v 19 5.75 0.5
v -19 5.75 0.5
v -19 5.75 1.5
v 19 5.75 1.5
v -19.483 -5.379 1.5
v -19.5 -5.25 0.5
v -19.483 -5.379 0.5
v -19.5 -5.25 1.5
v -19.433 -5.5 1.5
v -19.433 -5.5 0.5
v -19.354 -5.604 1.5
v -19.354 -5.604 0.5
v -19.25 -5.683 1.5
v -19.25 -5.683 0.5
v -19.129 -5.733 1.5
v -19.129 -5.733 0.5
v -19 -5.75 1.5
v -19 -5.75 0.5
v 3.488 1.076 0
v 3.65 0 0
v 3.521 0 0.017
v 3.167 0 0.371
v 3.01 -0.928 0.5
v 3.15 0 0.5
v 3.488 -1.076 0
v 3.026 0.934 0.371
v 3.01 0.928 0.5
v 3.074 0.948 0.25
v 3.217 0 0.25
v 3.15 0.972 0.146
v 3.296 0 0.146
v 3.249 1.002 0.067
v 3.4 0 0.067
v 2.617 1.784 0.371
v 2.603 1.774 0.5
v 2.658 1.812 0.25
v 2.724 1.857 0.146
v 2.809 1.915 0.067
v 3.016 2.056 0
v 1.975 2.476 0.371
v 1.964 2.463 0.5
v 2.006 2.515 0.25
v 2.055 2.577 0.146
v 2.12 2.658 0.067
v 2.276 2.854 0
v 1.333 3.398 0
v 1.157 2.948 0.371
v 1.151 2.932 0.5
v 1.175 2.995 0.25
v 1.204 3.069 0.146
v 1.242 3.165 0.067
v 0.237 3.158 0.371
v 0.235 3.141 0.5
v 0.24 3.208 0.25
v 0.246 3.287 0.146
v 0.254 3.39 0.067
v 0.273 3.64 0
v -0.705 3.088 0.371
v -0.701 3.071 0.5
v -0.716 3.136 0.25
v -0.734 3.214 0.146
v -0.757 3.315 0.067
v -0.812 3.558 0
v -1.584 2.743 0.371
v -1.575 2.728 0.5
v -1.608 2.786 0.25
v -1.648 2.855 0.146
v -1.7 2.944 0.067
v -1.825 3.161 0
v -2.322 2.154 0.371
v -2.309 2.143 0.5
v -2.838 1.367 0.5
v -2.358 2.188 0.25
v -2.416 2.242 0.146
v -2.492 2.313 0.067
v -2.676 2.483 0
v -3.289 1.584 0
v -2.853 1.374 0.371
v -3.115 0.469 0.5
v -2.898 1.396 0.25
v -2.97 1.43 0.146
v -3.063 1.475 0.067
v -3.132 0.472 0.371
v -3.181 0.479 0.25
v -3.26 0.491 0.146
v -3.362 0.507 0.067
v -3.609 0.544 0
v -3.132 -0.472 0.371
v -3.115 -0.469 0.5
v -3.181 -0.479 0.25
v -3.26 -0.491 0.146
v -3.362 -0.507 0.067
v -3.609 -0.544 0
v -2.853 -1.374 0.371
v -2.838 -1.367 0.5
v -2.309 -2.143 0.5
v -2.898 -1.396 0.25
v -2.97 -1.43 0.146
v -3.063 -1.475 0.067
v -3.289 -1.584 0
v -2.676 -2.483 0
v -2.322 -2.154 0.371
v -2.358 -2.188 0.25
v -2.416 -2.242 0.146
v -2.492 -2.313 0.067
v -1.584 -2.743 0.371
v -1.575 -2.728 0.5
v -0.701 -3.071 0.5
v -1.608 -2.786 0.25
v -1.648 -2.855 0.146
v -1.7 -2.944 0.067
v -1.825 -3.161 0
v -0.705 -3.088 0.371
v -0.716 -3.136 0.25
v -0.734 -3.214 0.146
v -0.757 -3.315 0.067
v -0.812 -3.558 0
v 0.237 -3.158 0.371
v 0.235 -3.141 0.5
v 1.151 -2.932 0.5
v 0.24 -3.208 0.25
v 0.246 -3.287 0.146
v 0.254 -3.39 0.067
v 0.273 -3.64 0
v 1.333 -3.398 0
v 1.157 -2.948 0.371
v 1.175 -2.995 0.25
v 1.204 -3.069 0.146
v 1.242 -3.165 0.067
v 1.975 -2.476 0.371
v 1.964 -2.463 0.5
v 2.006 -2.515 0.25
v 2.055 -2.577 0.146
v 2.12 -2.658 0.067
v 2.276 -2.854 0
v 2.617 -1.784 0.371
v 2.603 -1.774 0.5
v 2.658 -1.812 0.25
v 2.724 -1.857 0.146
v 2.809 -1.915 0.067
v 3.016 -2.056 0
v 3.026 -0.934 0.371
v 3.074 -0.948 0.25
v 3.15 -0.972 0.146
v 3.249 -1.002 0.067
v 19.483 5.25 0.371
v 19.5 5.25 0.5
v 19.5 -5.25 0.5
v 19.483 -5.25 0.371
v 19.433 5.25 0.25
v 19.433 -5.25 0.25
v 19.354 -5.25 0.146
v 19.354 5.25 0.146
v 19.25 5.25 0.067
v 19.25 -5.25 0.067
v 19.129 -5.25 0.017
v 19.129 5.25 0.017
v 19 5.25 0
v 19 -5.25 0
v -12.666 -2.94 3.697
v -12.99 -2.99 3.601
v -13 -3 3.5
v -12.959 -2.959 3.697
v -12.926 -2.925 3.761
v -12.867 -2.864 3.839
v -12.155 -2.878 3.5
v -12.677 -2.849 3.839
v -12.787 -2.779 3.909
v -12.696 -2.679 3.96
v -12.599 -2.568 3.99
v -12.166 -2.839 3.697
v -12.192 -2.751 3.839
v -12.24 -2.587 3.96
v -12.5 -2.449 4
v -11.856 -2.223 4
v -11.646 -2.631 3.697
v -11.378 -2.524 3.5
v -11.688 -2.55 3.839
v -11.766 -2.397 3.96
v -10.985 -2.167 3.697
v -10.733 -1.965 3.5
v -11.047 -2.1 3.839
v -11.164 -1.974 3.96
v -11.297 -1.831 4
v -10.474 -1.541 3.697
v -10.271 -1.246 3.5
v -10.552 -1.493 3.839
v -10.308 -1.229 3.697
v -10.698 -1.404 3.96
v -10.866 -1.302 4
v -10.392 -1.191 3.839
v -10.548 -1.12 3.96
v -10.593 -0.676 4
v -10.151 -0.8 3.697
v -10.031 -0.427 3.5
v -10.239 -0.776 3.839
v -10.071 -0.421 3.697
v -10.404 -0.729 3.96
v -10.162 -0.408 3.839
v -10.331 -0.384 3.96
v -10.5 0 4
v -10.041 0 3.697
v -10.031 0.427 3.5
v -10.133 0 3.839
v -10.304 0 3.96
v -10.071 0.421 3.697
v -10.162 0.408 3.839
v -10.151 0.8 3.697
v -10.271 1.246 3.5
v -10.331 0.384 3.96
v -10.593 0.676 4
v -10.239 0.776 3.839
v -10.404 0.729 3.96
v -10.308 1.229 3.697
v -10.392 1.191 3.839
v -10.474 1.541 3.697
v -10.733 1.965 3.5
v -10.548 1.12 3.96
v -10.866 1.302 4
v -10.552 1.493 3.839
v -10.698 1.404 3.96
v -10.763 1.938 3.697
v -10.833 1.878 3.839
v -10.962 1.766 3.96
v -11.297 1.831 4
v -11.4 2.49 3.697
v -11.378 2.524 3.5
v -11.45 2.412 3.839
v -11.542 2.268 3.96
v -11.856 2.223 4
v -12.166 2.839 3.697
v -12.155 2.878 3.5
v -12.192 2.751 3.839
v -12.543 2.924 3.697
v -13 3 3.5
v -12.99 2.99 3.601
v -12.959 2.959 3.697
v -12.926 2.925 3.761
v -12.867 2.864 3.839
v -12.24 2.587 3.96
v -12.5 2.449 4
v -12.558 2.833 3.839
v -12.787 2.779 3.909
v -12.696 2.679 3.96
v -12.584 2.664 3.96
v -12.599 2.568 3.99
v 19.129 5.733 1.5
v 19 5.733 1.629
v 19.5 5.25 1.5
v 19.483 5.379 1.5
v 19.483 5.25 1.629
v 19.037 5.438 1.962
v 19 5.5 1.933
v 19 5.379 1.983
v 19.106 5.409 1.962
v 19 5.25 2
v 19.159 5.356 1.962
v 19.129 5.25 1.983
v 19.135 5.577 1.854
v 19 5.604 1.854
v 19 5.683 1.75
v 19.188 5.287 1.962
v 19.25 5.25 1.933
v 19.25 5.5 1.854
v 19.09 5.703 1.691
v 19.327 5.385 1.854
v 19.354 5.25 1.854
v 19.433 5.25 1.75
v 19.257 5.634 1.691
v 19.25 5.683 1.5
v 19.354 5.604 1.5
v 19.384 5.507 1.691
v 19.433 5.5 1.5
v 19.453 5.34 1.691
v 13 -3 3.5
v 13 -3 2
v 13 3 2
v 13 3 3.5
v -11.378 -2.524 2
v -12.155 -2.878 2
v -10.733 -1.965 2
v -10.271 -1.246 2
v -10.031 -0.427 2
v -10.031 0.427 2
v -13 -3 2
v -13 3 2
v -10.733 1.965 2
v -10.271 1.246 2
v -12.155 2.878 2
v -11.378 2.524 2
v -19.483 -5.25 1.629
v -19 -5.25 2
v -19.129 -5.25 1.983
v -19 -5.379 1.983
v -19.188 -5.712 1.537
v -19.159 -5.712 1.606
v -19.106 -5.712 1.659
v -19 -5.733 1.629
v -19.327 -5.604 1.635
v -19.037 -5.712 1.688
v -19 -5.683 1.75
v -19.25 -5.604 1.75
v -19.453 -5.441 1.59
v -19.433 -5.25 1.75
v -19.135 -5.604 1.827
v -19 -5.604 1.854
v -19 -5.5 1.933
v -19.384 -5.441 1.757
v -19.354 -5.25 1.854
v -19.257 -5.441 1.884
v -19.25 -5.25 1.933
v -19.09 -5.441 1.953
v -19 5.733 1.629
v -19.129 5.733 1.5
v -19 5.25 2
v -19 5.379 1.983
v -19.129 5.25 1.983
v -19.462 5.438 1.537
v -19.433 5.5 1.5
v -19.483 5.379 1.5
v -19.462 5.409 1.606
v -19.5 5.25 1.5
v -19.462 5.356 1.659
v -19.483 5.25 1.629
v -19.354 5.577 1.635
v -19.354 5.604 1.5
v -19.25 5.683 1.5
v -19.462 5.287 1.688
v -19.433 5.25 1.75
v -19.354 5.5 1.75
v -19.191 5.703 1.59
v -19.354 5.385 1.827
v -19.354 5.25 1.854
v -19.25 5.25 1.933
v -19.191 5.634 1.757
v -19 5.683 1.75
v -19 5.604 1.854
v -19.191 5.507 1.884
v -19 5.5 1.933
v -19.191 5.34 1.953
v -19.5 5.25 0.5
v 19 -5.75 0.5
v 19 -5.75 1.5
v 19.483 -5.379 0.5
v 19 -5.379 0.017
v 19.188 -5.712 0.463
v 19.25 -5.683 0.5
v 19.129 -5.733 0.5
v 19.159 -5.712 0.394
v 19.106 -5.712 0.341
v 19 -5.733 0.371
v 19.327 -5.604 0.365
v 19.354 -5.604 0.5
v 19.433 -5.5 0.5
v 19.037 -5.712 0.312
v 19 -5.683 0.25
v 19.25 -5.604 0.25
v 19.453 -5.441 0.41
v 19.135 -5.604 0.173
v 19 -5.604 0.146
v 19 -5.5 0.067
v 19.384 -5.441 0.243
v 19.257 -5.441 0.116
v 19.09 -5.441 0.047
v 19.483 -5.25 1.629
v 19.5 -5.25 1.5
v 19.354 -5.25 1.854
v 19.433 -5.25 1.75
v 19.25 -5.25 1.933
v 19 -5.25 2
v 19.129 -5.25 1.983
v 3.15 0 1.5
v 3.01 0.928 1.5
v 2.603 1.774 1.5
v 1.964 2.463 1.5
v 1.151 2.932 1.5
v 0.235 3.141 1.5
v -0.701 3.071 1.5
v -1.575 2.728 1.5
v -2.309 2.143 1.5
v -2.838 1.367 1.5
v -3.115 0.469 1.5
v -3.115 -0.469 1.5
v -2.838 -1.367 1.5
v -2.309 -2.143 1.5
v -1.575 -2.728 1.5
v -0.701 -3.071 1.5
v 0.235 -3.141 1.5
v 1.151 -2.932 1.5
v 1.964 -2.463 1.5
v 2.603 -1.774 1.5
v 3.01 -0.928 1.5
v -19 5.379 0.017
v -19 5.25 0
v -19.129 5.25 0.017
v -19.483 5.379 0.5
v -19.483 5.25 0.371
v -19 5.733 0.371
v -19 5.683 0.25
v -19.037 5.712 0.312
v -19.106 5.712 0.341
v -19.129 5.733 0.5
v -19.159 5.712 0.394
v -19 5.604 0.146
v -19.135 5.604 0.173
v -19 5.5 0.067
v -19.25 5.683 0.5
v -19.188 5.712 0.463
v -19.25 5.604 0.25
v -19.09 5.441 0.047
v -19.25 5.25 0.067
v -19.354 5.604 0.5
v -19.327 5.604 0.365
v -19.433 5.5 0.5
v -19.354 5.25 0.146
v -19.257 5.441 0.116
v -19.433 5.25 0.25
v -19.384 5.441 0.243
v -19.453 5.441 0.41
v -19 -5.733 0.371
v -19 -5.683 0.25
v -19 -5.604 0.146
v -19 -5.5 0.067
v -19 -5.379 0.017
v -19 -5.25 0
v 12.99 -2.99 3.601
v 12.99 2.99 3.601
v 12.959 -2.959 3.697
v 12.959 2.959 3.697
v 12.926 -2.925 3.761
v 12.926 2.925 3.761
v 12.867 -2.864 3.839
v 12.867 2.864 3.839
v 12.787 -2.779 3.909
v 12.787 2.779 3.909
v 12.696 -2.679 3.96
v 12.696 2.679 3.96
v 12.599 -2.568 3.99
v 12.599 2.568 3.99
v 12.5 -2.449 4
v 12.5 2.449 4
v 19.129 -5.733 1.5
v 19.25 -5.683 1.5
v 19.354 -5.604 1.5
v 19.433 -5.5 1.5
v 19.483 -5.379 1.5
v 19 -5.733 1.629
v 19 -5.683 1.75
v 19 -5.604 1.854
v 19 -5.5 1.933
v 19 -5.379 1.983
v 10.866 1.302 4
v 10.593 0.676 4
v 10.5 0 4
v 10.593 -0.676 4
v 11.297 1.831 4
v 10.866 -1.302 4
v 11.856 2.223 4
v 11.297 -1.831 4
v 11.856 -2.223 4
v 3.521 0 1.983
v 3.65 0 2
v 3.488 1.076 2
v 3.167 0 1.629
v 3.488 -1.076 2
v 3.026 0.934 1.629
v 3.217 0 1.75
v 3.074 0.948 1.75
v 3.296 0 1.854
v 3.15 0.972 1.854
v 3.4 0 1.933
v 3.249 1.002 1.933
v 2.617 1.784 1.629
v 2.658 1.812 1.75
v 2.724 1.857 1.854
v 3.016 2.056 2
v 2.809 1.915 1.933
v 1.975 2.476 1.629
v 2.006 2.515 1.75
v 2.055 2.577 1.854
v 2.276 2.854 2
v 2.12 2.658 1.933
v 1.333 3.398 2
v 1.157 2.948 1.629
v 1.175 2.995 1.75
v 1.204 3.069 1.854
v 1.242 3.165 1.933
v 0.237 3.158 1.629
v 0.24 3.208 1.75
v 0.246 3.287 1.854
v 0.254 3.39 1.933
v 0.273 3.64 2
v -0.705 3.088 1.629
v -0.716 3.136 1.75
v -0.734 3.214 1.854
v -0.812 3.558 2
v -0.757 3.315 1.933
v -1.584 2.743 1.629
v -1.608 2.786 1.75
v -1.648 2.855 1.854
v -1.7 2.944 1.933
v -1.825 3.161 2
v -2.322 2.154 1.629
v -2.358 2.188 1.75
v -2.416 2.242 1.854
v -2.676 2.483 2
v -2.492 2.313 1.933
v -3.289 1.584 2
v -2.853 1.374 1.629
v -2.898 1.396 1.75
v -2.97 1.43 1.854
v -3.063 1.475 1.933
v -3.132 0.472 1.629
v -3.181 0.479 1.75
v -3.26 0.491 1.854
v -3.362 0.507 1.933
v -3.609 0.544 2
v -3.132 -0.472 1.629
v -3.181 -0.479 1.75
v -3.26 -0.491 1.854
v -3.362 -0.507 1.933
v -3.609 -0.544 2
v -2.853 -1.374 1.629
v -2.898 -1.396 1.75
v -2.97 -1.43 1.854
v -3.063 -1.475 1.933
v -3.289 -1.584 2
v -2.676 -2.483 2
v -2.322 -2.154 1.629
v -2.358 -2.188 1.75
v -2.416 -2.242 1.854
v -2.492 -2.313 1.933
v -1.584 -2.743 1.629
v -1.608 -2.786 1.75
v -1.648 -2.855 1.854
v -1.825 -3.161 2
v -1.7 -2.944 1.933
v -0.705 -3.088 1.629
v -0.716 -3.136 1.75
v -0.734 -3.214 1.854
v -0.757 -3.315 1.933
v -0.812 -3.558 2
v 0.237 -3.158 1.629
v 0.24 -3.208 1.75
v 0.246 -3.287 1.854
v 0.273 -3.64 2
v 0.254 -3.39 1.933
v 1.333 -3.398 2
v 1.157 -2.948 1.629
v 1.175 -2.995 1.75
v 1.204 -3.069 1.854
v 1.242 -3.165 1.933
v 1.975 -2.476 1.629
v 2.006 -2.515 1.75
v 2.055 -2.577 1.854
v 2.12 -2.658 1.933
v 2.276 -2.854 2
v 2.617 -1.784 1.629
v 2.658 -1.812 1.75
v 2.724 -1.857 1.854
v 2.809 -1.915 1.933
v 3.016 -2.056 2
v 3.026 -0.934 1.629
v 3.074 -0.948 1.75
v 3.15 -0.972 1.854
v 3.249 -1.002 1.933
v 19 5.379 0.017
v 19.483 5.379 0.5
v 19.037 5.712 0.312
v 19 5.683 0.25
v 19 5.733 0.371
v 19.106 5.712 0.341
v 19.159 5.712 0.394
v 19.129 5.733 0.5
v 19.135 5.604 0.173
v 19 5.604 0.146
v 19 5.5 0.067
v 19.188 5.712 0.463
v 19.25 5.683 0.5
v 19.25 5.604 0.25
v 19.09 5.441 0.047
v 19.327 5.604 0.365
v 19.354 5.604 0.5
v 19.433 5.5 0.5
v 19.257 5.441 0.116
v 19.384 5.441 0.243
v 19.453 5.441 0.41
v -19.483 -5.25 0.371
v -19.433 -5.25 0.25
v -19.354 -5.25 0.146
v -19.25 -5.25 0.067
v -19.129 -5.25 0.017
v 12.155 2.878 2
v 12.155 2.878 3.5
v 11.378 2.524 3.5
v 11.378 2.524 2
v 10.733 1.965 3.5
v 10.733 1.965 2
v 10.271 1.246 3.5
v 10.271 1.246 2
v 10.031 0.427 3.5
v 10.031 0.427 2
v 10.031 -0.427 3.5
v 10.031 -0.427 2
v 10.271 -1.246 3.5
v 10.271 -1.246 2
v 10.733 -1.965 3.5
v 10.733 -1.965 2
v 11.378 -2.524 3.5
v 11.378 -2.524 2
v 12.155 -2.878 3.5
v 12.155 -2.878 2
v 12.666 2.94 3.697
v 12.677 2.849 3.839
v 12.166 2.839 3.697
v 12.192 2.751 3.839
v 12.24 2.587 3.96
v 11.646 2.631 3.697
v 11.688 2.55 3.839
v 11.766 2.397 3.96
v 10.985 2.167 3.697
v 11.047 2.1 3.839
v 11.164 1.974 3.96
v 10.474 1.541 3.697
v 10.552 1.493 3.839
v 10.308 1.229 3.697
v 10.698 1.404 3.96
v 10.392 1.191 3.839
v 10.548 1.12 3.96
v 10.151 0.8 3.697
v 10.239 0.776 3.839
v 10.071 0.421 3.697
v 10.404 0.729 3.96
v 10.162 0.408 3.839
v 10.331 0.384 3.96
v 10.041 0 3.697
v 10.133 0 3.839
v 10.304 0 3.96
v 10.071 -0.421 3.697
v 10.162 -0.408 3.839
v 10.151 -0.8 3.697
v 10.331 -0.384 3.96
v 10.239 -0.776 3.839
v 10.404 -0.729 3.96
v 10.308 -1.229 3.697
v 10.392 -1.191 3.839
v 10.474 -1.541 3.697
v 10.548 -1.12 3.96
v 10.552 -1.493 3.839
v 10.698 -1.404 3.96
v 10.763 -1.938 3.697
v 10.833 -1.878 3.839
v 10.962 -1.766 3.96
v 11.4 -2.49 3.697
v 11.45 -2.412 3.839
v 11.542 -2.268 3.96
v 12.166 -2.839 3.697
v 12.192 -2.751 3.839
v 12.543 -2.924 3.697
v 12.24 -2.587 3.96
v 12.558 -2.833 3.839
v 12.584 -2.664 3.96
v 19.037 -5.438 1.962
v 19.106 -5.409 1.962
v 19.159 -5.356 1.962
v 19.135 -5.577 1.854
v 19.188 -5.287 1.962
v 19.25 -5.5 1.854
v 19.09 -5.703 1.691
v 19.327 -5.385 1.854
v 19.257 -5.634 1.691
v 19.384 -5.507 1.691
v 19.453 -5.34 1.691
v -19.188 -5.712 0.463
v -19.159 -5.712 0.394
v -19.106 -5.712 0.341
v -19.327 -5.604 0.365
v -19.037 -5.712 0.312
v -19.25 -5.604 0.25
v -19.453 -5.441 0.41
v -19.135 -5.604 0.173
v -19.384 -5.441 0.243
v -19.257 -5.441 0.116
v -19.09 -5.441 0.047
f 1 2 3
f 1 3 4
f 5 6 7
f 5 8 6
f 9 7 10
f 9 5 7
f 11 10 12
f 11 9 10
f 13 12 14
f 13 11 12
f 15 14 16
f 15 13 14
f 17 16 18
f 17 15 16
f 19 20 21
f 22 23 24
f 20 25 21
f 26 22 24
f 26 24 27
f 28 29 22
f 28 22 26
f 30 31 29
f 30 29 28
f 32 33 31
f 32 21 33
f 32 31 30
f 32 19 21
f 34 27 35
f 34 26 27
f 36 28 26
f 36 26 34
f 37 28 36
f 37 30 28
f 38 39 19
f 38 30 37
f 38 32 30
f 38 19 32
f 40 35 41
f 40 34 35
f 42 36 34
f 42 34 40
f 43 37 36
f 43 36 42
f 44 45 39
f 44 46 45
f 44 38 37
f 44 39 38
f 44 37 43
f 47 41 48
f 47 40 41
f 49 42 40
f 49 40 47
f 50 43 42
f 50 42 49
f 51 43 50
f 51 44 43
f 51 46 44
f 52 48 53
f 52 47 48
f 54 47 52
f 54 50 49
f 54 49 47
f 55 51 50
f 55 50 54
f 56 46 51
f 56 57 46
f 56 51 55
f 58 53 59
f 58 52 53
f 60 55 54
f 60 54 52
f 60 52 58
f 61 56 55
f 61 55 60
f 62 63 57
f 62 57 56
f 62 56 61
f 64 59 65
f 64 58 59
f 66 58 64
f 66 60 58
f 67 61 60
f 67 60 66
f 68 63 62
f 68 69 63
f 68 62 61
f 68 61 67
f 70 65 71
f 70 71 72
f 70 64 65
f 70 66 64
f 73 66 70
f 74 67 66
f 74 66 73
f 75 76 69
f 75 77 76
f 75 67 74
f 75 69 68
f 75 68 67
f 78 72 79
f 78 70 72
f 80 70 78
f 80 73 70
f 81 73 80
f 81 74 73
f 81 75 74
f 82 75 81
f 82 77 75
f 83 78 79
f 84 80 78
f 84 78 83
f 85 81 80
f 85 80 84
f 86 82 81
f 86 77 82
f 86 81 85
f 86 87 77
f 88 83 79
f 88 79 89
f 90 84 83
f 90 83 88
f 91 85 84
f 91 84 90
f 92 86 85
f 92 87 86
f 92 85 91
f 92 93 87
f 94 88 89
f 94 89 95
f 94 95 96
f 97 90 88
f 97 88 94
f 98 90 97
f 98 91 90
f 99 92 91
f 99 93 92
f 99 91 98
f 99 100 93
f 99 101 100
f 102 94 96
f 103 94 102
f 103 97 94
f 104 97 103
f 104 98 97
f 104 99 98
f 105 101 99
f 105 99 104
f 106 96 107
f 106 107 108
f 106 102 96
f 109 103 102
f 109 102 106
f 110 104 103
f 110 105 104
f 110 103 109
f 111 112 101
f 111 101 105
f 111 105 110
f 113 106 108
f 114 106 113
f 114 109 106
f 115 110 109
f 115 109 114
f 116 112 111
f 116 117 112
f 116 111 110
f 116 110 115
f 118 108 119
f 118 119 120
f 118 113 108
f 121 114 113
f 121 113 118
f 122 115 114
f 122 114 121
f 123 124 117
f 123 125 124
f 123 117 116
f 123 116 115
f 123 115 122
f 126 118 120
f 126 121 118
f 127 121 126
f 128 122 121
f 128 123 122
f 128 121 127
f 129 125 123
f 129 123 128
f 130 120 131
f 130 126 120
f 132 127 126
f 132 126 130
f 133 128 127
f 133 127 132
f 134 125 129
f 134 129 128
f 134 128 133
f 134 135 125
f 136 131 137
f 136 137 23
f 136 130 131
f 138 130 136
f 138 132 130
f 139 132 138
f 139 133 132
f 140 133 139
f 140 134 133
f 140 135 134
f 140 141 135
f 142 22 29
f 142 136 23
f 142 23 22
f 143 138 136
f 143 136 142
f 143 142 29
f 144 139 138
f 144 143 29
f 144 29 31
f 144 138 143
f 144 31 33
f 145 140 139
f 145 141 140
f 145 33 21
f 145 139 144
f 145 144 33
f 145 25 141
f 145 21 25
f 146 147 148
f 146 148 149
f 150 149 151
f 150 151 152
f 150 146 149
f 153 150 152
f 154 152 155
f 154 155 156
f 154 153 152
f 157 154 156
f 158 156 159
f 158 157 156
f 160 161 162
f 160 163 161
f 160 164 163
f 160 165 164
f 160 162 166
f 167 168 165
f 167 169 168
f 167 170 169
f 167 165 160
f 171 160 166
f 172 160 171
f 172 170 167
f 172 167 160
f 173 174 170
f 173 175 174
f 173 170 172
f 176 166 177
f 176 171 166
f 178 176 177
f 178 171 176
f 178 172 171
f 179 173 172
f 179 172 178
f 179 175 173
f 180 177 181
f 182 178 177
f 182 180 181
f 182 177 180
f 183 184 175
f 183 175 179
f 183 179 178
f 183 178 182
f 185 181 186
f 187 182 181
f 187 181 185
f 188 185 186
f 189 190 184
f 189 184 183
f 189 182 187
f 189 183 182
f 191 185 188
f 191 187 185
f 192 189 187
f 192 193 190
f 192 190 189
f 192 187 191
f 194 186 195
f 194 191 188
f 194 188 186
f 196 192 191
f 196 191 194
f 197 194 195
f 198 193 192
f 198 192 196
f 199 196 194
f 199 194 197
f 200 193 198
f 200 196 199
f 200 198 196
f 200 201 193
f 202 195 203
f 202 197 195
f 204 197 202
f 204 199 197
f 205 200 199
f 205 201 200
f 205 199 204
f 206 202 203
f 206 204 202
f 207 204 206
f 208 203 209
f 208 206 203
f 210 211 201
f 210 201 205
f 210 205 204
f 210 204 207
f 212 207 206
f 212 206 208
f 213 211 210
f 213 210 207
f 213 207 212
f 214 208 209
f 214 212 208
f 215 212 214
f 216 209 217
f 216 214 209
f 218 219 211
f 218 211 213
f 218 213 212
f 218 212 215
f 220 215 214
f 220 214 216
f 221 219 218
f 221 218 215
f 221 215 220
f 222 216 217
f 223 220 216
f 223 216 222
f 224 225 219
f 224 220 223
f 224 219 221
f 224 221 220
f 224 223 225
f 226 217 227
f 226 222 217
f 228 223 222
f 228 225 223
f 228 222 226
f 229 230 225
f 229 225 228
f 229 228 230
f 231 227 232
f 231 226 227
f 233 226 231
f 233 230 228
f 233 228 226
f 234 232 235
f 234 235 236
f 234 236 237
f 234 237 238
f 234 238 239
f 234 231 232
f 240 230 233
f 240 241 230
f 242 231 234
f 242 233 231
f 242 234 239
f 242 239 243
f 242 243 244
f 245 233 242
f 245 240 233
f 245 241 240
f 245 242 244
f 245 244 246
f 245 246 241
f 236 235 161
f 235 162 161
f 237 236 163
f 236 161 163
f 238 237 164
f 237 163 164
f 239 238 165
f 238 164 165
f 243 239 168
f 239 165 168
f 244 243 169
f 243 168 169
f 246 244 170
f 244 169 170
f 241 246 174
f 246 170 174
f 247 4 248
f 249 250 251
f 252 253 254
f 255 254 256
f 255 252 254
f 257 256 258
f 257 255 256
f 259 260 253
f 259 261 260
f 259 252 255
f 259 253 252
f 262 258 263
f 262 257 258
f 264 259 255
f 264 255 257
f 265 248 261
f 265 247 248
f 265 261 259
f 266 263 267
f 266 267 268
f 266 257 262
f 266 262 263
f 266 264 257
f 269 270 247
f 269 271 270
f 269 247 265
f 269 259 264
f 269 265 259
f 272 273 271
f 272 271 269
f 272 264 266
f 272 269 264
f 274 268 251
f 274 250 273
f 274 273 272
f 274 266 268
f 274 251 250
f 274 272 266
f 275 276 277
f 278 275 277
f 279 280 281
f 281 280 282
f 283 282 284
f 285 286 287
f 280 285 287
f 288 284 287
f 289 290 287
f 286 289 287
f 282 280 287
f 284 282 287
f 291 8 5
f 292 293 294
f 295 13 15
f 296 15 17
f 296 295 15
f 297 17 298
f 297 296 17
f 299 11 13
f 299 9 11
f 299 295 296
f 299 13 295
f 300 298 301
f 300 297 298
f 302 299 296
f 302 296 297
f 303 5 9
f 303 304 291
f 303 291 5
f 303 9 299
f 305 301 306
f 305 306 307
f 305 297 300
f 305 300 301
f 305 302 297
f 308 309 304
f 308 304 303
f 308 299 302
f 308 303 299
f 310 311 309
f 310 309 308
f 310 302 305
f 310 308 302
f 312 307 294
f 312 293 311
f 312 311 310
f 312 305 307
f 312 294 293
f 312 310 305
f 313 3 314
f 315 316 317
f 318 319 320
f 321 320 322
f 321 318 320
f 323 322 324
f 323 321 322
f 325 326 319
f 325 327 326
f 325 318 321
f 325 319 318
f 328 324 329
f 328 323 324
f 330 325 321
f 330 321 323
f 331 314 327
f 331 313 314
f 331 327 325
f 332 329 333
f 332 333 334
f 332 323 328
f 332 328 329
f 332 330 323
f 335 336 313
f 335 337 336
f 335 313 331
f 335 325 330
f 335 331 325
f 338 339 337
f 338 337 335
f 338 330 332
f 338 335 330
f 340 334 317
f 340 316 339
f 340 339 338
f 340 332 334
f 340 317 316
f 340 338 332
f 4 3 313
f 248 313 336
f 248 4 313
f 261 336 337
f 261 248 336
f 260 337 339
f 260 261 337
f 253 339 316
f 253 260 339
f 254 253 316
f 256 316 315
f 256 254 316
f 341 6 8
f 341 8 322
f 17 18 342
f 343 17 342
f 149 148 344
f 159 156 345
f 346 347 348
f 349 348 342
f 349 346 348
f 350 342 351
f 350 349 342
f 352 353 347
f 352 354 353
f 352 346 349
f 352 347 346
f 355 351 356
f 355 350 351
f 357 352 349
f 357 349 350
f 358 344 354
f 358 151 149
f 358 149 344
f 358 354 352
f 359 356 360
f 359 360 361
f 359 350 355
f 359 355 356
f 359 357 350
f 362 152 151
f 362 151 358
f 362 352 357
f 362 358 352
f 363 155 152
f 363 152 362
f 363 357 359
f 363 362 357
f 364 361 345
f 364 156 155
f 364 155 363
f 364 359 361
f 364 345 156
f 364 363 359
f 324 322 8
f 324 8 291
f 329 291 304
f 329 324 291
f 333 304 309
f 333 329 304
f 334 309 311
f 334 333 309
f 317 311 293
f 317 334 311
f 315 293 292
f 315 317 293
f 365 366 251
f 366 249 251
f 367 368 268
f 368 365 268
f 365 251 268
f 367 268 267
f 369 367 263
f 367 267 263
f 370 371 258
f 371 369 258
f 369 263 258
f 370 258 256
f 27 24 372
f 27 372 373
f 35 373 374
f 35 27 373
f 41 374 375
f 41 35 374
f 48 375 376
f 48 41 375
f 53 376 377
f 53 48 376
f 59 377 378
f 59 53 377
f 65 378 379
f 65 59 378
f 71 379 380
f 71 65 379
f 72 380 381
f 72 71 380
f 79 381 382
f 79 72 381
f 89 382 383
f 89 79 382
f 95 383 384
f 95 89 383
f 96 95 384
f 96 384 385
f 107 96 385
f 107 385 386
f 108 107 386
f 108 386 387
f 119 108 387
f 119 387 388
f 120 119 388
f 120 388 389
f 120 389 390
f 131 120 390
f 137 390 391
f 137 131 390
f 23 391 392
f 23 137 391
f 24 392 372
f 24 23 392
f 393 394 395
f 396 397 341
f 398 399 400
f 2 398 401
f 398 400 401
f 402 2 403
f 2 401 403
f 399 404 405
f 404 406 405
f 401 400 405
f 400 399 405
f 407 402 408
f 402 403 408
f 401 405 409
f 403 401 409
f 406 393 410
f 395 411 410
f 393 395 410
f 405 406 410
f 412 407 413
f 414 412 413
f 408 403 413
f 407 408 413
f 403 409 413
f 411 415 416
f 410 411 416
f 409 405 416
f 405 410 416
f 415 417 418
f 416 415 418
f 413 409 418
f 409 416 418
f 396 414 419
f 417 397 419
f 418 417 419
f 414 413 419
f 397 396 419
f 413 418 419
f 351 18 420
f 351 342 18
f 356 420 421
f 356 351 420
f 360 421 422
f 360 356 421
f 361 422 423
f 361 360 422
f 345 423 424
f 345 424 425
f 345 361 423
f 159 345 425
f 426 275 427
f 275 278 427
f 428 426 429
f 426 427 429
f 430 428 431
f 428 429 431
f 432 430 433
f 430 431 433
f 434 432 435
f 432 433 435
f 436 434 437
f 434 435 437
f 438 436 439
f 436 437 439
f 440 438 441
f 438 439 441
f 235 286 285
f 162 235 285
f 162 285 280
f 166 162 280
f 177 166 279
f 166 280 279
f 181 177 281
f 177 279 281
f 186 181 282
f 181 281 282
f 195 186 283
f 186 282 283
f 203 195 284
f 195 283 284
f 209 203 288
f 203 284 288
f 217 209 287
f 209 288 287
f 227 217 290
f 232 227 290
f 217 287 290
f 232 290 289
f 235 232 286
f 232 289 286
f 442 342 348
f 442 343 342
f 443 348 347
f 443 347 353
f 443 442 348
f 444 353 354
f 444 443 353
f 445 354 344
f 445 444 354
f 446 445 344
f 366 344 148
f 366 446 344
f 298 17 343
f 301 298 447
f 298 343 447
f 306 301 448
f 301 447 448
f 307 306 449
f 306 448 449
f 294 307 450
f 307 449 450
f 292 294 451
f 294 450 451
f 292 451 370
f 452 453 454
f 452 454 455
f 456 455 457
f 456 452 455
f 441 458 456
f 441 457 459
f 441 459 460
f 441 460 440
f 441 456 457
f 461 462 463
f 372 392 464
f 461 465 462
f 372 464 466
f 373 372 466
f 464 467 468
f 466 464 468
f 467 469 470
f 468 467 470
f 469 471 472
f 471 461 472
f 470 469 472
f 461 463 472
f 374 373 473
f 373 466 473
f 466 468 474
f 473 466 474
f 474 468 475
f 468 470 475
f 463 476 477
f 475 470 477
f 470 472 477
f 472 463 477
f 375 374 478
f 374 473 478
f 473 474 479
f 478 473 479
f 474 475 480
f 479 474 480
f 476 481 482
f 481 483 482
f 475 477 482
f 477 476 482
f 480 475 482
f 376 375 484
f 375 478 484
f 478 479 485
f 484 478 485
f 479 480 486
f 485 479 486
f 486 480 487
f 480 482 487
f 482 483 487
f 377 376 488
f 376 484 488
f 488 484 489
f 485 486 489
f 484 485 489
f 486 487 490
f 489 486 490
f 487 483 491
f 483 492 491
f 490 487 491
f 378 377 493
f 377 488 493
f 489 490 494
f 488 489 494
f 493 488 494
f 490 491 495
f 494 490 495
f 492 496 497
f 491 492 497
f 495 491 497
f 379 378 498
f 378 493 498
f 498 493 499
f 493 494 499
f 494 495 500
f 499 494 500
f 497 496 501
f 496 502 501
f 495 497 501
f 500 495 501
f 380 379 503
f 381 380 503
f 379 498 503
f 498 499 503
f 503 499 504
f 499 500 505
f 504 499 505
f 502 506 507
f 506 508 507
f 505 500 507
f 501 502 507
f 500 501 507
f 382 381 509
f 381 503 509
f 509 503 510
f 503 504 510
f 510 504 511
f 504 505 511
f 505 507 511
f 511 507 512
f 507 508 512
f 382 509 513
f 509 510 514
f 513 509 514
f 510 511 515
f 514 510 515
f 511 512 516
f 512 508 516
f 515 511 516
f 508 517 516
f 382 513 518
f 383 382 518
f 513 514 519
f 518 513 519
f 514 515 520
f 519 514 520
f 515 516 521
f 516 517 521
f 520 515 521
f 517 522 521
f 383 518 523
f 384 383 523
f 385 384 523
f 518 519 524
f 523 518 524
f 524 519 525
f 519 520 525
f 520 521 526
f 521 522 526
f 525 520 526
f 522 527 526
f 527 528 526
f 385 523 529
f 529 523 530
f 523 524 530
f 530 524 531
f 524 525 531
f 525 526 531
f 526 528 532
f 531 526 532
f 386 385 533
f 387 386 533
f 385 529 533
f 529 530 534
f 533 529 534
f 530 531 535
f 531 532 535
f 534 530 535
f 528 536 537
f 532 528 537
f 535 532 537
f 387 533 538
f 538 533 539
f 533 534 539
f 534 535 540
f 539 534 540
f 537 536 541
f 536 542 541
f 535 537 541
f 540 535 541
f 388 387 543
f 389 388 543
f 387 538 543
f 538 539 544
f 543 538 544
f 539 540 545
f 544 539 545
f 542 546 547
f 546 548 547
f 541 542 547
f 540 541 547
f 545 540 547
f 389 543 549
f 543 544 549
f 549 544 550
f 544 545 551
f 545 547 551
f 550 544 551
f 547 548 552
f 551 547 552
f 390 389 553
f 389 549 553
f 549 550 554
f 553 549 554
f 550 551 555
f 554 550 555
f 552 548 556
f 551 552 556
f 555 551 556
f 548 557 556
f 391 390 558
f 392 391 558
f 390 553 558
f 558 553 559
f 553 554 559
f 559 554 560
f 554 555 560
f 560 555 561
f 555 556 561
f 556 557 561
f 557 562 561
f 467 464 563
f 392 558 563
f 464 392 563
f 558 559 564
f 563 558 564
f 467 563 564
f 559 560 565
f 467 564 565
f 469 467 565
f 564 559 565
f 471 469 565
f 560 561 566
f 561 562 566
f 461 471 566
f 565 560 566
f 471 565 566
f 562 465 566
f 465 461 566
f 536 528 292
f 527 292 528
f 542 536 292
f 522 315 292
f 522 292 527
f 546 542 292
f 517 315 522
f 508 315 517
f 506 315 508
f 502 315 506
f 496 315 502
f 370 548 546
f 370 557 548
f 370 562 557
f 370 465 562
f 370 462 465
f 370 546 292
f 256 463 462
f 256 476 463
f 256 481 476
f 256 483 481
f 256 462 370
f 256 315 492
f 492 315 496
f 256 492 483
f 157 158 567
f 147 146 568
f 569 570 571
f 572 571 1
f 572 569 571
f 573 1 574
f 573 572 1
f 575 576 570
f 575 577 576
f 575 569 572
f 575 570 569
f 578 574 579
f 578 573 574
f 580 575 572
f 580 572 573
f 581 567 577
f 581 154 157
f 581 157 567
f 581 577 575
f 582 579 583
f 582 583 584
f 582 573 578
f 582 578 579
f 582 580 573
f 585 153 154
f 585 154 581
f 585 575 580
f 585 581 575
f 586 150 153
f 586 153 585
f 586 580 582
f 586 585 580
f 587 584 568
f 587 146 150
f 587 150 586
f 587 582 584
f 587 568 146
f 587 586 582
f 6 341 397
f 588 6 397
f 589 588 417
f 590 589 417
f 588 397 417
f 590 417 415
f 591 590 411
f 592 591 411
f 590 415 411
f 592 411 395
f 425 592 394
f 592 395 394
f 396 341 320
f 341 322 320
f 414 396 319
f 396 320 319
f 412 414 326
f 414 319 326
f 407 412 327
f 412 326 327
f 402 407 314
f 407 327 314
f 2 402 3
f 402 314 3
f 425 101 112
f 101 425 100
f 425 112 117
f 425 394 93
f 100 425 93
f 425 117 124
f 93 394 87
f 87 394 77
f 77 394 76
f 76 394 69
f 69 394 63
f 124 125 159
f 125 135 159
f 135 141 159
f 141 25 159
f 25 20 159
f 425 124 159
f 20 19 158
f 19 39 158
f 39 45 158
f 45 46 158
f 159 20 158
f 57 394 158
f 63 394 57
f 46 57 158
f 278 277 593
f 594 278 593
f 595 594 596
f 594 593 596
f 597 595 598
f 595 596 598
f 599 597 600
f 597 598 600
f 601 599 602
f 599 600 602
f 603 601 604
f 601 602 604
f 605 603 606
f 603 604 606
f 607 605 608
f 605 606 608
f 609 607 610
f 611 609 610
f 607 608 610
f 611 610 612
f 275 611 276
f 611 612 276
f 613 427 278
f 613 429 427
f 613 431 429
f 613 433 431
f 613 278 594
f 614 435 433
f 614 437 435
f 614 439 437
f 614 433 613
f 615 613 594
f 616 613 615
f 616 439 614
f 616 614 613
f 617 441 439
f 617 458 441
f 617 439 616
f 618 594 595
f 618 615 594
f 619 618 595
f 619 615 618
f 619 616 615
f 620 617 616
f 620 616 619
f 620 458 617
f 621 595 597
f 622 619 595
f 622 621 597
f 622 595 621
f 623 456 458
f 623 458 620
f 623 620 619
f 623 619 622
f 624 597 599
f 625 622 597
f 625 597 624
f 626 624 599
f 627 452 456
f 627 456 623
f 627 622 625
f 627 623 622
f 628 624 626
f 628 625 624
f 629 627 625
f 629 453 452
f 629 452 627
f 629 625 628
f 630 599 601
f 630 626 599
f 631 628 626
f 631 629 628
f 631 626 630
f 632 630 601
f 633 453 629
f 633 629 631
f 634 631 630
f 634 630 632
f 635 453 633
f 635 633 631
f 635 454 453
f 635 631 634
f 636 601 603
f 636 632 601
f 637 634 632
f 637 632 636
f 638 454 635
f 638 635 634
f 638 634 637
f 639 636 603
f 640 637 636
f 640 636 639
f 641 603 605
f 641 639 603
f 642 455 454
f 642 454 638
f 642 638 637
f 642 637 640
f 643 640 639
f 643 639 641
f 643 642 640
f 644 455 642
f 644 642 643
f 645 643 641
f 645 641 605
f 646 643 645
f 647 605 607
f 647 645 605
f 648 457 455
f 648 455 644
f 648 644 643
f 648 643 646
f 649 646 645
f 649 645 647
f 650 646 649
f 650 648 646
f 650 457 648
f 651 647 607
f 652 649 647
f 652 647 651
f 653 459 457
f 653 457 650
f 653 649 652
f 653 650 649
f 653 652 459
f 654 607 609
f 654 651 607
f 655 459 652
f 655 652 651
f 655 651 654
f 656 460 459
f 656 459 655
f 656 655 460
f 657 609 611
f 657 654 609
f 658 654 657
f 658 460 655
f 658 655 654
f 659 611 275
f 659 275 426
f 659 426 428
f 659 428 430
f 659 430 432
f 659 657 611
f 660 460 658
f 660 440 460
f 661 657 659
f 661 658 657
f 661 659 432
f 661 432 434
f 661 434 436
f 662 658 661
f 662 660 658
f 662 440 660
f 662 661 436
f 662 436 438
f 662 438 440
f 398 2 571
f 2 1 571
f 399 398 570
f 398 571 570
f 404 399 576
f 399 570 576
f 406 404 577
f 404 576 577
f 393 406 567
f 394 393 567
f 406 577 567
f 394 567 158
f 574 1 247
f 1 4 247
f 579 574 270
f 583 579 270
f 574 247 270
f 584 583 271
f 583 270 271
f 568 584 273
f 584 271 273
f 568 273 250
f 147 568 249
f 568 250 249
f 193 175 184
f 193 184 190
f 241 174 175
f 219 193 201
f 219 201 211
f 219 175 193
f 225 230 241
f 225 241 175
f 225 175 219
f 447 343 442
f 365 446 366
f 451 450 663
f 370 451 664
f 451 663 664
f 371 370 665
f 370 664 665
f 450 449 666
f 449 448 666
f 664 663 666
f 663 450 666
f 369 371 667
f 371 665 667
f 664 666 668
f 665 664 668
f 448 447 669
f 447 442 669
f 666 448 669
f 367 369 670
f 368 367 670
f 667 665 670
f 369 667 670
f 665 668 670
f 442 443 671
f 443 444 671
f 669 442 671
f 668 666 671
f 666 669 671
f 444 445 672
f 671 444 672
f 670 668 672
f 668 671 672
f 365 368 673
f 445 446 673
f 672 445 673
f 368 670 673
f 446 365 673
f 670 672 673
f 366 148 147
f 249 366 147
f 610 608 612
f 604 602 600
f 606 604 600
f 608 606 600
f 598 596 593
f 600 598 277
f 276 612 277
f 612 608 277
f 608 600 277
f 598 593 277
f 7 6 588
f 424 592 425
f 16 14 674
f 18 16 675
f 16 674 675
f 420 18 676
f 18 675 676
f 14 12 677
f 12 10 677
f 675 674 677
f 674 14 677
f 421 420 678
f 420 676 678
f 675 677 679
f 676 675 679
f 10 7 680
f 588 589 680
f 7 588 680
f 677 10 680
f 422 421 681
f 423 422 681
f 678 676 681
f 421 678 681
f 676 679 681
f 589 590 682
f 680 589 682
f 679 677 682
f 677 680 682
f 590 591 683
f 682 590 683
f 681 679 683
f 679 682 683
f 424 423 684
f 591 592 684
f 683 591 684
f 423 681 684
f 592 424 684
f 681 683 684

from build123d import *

# Parameters (mm, degrees)
F0_W     = 39
F0_H     = 11.5
F0_R     = 3.15
F1_DEPTH = 2
F3_DEPTH = 2
F4_R     = 0.5
F4_2_R   = 0.5


with BuildPart() as f1:
    # F0 (on Top) → F1 (new body)
    with BuildSketch(Plane.XY):
        Rectangle(F0_W, F0_H)
        Circle(F0_R, mode=Mode.SUBTRACT)
    extrude(amount=F1_DEPTH)

    # F4
    f4_edges = [f1.edges().sort_by_distance(p)[0] for p in [
        (-3.15, 0, 2),
        (-19.5, 0, 0),
        (19.5, 0, 0),
        (0, 5.75, 0),
        (19.5, 5.75, 1),
        (19.5, -5.75, 1),
        (0, 5.75, 2),
        (-19.5, 5.75, 1),
        (-19.5, 0, 2),
        (-19.5, -5.75, 1),
        (0, -5.75, 2),
        (19.5, 0, 2),
        (0, -5.75, 0),
        (-3.15, 0, 0),
    ]]
    fillet(f4_edges, radius=F4_R)


with BuildPart() as f3:
    # F2 (on face) → F3 (new body)
    with BuildSketch(Plane.XY.offset(2)):
        with BuildLine():
            Line((-13, 3), (-13, -3))
            ThreePointArc((-13, -3), (-10, 0), (-13, 3))
        make_face()
        with BuildLine():
            ThreePointArc((13, 3), (10, 0), (13, -3))
            Line((13, -3), (13, 3))
        make_face()
    extrude(amount=F3_DEPTH)

    # F4#2
    f4_2_edges = [f3.edges().sort_by_distance(p)[0] for p in [
        (10, 0, 4),
        (-10, 0, 4),
        (-13, 0, 4),
        (13, 0, 4),
    ]]
    fillet(f4_2_edges, radius=F4_2_R)


solid = Compound([f1.part, f3.part])
